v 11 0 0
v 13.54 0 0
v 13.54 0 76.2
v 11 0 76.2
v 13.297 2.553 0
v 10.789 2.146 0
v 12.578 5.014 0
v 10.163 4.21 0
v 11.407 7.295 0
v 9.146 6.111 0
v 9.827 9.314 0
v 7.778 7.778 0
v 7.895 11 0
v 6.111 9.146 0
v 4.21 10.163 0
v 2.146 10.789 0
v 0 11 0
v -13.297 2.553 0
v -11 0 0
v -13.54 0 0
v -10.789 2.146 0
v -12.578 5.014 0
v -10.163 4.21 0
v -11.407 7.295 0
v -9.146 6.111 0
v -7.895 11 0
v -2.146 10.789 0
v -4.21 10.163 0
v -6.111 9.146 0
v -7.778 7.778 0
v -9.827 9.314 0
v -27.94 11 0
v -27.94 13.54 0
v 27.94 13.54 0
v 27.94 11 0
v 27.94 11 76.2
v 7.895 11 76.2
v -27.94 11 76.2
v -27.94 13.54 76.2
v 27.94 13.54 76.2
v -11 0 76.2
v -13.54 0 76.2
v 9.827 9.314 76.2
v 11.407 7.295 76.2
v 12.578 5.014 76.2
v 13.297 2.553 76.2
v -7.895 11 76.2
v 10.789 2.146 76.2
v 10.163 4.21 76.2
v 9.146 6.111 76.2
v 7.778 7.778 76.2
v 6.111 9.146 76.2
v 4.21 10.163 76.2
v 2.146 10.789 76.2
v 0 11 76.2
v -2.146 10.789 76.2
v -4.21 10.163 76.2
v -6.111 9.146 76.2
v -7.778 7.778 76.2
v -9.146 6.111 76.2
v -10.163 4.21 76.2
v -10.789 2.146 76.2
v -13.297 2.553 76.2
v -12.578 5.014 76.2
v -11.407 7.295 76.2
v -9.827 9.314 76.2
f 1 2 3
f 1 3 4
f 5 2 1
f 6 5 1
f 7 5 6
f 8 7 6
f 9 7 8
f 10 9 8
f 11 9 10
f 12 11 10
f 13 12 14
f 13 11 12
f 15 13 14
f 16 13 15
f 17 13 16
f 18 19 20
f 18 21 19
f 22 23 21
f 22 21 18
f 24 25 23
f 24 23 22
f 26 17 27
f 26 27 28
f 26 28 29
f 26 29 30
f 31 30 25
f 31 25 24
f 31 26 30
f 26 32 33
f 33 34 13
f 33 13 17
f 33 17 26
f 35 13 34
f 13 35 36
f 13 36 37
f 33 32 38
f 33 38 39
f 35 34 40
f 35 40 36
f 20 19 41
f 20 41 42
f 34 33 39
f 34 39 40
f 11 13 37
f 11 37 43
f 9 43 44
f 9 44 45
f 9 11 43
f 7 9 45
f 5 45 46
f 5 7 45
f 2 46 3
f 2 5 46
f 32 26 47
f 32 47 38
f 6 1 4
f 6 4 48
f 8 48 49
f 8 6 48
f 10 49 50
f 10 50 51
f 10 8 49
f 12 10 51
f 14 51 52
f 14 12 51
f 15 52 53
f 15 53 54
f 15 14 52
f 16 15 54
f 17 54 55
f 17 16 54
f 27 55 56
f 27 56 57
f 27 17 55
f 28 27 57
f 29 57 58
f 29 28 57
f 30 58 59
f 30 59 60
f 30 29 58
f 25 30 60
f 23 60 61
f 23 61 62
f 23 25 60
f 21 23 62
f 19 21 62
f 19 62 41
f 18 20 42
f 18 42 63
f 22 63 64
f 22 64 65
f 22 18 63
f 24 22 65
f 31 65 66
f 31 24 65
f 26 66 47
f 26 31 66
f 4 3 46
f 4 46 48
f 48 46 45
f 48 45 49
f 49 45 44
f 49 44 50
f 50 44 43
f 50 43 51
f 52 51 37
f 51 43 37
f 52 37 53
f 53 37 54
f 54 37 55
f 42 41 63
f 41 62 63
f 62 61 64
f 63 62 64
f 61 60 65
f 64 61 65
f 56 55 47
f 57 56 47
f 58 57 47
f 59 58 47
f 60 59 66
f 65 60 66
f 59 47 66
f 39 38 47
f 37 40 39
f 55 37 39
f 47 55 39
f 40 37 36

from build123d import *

# Parameters (mm, degrees)
BOSS_EXTRUDE1_DEPTH = 76.2


with BuildPart() as part:
    # Sketch1 → Boss-Extrude1 (new body)
    with BuildSketch(Plane.XY):
        with BuildLine():
            Line((-11, 0), (-13.54, 0))
            ThreePointArc((-13.54, 0), (-12.046376905, 6.181941723), (-7.895036415, 11))
            Line((-7.895036415, 11), (-27.94, 11))
            Line((-27.94, 11), (-27.94, 13.54))
            Line((-27.94, 13.54), (27.94, 13.54))
            Line((27.94, 13.54), (27.94, 11))
            Line((27.94, 11), (7.895036415, 11))
            ThreePointArc((7.895036415, 11), (12.046376905, 6.181941723), (13.54, 0))
            Line((13.54, 0), (11, 0))
            ThreePointArc((11, 0), (0, 11), (-11, 0))
        make_face()
    extrude(amount=BOSS_EXTRUDE1_DEPTH)


solid = part.part
